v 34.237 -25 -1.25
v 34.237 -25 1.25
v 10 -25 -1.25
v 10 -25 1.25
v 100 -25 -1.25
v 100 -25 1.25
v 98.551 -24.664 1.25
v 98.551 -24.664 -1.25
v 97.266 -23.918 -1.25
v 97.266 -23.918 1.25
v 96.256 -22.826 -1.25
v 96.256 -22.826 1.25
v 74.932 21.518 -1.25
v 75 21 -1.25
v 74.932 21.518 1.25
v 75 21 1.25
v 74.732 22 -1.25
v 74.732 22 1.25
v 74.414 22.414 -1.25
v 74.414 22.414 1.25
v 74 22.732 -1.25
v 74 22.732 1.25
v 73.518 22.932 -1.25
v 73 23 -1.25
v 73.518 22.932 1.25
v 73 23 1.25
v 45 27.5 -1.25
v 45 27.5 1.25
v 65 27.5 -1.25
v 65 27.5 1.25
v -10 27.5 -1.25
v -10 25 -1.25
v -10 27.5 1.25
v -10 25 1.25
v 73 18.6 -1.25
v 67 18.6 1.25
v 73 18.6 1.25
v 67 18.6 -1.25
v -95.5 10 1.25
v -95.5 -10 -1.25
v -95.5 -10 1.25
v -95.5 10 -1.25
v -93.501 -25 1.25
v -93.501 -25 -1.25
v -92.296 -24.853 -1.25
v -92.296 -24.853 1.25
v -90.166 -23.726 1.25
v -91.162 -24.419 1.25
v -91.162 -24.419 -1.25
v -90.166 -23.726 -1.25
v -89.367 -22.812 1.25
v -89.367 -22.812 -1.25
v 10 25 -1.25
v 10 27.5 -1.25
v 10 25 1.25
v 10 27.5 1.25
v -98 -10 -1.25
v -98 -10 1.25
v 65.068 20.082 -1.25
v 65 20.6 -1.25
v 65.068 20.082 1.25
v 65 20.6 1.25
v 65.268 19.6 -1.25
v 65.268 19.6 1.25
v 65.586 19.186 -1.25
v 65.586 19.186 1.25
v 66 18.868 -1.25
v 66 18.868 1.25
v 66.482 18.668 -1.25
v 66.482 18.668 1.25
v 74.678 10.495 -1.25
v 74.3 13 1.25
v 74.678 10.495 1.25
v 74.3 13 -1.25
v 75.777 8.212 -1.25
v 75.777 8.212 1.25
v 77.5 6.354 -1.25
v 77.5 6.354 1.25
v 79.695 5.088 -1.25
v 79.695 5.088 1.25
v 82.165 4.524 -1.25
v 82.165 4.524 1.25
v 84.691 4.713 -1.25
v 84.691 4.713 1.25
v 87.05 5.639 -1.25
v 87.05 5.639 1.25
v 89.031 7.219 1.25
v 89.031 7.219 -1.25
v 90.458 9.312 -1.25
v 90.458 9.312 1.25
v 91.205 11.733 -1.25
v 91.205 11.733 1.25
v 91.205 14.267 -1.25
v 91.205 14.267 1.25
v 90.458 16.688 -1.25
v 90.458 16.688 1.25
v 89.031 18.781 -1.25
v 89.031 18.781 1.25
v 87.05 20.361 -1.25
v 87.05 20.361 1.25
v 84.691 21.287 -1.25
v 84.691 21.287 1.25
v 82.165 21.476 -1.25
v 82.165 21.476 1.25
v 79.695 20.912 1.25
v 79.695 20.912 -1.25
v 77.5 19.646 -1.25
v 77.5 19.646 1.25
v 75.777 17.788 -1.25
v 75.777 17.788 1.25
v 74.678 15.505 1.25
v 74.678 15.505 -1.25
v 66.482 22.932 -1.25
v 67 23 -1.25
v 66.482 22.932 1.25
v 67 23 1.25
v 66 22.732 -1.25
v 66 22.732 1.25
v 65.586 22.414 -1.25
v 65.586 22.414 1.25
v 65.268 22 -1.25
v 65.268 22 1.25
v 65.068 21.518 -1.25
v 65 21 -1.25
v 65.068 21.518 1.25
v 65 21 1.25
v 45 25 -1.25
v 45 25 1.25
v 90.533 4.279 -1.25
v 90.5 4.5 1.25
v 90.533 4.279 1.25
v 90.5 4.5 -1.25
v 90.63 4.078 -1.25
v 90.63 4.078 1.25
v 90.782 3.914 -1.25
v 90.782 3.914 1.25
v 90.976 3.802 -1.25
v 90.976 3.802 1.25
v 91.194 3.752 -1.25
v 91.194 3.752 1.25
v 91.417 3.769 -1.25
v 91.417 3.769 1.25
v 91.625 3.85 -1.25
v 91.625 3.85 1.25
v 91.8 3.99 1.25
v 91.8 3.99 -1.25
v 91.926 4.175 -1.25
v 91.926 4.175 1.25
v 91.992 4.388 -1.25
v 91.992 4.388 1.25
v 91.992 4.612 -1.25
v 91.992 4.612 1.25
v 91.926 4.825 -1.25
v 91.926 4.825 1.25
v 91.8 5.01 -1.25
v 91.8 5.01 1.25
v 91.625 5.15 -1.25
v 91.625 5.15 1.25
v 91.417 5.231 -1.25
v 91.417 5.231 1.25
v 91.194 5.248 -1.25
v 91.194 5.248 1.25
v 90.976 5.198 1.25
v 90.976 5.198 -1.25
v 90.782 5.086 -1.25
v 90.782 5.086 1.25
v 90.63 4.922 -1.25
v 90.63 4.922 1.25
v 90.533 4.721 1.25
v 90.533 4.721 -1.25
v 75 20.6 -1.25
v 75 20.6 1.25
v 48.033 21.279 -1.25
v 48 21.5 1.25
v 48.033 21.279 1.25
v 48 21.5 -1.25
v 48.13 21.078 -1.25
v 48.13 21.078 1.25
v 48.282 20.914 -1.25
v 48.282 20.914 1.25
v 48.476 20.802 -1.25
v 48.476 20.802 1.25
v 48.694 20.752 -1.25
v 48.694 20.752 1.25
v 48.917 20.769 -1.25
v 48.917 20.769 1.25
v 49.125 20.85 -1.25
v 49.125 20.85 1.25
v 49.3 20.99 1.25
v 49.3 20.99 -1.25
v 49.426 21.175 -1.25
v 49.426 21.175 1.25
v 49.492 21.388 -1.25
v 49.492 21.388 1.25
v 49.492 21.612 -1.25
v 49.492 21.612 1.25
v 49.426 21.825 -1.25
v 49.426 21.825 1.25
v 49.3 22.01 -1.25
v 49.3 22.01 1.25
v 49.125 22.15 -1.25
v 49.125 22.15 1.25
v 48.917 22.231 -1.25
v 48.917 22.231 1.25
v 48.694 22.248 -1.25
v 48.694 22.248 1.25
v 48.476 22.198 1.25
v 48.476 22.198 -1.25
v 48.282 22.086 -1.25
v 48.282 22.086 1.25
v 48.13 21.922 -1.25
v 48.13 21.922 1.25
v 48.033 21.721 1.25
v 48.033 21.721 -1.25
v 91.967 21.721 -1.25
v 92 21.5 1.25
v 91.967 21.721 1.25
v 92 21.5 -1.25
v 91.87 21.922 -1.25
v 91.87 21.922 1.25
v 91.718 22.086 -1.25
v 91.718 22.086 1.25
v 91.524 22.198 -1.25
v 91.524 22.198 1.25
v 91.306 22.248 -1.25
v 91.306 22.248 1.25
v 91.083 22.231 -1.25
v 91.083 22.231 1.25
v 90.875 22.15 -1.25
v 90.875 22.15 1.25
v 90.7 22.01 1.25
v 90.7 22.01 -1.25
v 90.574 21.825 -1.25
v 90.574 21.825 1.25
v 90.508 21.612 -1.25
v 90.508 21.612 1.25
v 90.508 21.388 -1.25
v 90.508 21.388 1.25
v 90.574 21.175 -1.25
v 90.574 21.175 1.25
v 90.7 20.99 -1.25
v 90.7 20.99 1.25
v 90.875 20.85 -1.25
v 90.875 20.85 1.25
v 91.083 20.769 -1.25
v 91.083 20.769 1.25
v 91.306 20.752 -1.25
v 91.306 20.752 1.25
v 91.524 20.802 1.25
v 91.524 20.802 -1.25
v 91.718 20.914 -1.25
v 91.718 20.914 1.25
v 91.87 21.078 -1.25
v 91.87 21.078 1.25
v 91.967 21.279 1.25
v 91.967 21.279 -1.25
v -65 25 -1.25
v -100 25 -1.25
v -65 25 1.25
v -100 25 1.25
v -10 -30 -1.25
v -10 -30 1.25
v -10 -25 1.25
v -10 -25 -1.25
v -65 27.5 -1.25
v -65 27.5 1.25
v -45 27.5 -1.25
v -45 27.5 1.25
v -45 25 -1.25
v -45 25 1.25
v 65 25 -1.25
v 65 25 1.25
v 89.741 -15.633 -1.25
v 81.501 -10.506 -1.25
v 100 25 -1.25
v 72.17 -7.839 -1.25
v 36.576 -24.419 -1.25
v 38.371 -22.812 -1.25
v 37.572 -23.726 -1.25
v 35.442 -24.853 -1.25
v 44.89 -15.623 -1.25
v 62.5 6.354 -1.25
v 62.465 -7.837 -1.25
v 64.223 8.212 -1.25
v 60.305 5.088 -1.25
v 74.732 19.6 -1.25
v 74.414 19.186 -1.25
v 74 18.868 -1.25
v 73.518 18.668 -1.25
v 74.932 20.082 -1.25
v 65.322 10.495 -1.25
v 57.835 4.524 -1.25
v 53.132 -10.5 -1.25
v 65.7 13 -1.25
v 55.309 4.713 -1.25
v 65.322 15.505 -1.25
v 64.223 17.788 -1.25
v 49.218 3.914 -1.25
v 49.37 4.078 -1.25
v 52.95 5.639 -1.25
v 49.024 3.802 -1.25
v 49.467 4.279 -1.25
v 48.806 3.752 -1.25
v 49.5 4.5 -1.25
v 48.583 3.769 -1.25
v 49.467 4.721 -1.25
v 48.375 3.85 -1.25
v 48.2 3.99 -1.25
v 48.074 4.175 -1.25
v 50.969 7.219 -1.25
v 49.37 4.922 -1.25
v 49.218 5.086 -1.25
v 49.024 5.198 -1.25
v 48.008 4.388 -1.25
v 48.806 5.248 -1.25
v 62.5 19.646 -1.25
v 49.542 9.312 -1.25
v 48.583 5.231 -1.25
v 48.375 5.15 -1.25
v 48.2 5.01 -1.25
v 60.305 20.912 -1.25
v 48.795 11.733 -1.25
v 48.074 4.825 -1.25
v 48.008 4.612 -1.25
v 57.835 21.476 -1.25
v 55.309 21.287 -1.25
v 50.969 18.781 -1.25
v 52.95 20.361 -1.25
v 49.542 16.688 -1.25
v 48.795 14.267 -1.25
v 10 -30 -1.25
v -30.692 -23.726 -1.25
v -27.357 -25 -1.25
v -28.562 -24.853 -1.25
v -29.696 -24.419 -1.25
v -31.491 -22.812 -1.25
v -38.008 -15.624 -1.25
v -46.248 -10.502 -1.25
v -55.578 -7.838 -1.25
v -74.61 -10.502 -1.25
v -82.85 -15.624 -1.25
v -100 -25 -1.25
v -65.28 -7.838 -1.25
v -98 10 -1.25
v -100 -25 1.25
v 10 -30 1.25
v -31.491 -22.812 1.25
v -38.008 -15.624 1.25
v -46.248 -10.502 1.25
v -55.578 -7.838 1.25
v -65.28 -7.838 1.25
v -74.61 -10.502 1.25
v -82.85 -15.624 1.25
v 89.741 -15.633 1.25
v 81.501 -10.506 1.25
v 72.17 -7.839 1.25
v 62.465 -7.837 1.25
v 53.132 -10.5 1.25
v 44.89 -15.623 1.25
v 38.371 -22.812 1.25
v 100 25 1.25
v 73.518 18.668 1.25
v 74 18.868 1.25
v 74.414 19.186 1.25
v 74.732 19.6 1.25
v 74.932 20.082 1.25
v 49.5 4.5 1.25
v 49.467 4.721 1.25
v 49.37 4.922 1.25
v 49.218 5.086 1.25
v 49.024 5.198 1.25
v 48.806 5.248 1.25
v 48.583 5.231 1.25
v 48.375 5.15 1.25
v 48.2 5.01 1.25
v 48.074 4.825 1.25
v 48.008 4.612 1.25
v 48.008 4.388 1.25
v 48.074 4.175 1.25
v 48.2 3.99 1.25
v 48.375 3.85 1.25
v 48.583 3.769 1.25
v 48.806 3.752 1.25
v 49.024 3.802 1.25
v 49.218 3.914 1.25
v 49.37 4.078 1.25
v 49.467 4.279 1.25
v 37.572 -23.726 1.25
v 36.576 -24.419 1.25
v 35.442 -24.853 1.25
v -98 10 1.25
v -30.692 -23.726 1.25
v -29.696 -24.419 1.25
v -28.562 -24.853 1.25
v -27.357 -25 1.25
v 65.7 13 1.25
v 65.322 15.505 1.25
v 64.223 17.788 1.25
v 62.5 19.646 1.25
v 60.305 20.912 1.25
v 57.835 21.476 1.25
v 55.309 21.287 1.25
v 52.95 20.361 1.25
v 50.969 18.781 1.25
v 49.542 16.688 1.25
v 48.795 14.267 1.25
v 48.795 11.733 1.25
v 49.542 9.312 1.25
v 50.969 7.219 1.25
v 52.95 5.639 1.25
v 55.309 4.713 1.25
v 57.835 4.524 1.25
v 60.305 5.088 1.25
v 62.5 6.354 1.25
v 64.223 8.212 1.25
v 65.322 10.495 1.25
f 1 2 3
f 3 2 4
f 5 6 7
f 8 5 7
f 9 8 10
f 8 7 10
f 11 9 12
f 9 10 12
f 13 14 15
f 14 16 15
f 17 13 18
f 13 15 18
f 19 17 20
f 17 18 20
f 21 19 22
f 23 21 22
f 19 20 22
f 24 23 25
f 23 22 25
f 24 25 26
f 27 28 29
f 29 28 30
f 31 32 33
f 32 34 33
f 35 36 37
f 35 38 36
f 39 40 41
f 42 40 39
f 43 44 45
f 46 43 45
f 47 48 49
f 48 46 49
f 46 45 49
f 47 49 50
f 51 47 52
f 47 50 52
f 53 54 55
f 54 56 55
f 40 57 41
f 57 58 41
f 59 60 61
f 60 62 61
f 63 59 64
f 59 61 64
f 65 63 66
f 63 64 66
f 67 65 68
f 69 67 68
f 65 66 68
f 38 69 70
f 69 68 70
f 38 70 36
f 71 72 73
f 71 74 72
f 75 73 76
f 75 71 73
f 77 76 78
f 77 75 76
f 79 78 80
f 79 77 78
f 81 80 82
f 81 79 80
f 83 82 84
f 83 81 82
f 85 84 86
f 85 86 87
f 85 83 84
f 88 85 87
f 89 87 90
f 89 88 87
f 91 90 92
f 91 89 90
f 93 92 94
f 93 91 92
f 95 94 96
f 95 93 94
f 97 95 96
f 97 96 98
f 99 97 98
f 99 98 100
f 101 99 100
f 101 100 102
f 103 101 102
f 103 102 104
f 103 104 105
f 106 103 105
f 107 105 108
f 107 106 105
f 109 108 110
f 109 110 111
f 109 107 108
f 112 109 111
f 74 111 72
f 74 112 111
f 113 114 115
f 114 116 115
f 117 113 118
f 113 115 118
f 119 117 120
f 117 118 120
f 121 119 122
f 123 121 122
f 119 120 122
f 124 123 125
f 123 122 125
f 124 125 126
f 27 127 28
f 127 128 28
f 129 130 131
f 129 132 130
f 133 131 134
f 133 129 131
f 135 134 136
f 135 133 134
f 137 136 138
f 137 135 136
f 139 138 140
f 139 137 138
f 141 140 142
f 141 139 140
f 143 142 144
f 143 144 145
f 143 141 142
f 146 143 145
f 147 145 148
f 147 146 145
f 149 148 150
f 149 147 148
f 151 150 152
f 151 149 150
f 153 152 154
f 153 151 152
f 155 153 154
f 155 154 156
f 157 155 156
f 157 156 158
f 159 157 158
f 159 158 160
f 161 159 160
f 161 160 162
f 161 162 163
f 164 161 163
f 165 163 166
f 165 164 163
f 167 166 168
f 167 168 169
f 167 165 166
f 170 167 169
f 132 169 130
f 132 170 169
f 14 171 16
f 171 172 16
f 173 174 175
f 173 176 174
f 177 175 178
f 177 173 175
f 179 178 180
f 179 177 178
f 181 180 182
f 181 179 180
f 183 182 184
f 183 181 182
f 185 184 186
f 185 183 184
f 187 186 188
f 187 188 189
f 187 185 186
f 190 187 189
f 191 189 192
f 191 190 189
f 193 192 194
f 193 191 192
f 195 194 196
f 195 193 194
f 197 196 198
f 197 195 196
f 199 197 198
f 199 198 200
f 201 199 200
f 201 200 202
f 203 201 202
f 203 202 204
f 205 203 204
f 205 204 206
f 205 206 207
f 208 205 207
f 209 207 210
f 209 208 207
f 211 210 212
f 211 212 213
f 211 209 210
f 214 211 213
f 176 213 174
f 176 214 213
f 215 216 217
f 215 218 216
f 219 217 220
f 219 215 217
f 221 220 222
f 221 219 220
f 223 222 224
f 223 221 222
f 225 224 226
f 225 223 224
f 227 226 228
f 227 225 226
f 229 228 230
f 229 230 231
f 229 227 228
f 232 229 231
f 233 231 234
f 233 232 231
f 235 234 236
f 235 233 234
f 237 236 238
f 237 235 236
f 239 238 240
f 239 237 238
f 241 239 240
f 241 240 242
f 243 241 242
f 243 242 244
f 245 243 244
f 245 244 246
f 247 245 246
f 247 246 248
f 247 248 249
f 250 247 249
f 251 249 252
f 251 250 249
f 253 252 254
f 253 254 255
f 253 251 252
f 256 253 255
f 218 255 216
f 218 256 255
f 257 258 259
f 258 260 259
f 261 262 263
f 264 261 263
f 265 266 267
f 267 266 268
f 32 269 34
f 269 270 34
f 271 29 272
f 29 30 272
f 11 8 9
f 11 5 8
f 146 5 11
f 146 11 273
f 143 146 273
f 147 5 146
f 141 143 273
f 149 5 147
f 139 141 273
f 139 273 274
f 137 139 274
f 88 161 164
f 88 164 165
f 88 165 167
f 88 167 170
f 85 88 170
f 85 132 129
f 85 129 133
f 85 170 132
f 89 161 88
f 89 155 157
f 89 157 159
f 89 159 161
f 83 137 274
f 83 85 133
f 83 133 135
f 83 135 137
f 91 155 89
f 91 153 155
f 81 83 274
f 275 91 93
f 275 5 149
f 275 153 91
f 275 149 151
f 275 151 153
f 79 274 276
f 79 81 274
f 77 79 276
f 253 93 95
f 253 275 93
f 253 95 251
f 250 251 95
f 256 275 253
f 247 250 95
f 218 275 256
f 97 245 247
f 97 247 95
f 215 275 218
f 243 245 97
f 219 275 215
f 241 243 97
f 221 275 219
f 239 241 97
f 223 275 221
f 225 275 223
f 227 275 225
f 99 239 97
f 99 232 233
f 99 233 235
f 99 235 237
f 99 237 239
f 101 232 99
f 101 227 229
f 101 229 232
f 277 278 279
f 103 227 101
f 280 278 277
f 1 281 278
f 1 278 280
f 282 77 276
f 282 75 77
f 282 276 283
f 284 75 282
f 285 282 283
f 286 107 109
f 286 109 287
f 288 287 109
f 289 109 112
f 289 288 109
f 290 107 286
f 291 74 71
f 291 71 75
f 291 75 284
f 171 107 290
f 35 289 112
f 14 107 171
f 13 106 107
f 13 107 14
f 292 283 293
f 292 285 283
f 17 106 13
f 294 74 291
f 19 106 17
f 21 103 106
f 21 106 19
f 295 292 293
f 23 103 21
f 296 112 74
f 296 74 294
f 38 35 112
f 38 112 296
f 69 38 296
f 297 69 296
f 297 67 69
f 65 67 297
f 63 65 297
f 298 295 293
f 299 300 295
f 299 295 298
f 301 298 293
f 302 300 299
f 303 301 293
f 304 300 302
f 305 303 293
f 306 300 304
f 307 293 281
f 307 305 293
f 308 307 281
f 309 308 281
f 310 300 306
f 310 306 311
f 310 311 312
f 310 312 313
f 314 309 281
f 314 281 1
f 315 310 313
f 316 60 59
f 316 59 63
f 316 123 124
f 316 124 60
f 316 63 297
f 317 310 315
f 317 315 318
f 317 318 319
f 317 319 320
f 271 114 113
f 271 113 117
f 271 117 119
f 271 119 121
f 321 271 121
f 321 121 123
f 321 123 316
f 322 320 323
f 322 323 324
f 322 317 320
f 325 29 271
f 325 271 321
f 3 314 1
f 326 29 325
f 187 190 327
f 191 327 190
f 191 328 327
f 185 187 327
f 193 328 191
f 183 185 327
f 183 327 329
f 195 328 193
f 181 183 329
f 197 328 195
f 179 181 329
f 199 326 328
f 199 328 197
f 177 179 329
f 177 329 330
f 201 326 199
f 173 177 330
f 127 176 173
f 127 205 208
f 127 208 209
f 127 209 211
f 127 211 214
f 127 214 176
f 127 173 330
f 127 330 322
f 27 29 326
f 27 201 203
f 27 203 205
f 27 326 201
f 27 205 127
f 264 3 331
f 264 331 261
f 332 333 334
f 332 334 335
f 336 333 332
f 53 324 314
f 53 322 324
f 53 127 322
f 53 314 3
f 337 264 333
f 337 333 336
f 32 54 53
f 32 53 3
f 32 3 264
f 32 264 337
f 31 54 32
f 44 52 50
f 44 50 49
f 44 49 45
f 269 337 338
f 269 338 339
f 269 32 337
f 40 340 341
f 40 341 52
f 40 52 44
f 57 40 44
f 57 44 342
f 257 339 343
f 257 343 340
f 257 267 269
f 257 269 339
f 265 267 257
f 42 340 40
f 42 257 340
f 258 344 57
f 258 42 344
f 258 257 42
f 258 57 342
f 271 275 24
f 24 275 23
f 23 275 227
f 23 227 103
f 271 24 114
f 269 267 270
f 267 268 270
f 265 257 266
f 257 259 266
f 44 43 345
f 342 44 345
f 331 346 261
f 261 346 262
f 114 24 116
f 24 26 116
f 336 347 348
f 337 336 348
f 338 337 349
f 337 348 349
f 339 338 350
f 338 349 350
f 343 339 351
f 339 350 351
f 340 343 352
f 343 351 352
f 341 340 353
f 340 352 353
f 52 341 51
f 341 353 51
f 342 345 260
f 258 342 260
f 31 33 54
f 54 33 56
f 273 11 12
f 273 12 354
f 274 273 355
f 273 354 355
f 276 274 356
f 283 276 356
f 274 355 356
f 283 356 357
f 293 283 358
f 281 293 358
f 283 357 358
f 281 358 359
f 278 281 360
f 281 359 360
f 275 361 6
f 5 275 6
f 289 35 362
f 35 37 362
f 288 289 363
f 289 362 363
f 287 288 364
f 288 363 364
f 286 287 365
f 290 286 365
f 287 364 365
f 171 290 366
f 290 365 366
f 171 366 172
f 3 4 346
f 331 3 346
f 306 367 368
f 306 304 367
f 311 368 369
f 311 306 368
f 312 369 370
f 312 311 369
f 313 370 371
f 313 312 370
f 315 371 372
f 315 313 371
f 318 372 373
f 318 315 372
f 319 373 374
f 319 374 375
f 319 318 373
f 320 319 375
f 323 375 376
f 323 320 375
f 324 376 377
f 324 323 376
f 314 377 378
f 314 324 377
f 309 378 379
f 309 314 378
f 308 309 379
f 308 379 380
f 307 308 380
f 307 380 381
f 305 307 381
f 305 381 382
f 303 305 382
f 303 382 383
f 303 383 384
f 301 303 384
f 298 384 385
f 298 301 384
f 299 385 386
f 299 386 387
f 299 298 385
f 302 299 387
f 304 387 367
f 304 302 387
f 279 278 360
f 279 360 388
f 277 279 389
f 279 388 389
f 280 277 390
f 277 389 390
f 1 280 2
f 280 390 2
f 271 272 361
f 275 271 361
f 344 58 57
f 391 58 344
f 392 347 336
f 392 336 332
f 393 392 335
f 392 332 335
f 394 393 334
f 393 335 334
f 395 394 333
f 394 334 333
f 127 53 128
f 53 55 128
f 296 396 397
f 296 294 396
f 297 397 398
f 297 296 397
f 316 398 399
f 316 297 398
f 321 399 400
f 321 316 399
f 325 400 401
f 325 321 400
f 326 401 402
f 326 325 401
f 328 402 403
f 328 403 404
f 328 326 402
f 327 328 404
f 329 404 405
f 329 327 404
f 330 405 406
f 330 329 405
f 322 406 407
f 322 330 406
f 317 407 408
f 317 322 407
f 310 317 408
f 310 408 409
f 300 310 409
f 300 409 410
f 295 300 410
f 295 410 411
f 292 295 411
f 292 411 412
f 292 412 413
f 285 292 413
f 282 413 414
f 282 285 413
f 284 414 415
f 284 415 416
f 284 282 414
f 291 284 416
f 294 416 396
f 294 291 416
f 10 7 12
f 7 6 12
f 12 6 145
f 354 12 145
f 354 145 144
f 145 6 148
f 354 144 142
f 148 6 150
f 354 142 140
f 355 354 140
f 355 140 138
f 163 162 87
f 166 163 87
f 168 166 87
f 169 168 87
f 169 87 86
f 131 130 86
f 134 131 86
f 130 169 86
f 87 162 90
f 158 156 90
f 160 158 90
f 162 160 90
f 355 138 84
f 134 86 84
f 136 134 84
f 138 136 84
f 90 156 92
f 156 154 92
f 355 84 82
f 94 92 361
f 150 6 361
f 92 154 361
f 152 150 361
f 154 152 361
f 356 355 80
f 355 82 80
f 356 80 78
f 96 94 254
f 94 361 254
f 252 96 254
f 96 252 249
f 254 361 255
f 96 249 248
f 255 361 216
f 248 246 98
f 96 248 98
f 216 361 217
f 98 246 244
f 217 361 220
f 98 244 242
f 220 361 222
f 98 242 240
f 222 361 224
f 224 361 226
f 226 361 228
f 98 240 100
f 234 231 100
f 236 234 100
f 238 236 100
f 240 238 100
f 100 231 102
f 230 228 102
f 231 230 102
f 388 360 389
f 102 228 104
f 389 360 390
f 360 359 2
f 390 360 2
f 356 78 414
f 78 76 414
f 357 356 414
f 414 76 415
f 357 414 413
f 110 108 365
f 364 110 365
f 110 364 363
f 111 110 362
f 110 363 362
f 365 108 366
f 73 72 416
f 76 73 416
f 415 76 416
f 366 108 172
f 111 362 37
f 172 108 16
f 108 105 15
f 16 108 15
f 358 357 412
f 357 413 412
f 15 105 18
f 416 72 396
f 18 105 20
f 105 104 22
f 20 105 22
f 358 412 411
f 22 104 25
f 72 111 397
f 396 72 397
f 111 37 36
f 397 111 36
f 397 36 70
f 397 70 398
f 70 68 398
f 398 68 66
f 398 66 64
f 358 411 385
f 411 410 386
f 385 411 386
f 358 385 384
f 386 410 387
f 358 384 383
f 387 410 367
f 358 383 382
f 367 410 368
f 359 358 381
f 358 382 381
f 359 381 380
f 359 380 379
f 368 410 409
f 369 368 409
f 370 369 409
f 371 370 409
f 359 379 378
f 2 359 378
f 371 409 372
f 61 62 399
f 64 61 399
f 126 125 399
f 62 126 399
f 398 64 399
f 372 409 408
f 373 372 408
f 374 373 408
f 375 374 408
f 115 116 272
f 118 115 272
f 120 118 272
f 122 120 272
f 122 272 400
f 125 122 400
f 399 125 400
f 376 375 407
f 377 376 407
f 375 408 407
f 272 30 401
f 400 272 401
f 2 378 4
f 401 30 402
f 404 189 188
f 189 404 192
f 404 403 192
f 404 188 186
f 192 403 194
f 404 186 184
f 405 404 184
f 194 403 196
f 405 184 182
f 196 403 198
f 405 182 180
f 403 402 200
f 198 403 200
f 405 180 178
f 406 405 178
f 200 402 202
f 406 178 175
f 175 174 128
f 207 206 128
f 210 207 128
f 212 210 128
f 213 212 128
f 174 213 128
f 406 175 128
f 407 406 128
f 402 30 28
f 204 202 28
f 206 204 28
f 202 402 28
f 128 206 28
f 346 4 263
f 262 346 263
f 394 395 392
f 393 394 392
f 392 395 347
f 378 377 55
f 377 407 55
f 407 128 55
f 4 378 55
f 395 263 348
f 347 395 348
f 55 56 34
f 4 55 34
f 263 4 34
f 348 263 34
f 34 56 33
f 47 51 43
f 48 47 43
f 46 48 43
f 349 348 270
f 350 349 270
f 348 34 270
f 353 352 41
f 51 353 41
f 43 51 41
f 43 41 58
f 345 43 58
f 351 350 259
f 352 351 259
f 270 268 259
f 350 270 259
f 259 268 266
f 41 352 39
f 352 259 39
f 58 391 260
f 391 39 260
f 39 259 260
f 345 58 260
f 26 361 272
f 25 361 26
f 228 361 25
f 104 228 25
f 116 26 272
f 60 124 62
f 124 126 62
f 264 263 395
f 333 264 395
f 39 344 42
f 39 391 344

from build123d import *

# Parameters (mm, degrees)
SKETCH1_R           = 8.5
SKETCH1_R_2         = 0.75
SKETCH1_W           = 2.5
SKETCH1_H           = 20
BOSS_EXTRUDE1_DEPTH = 1.25
FILLET2_R           = 5


with BuildPart() as part:
    # Sketch1 → Boss-Extrude1 (new, symmetric)
    with BuildSketch(Plane.XY):
        with BuildLine():
            Line((-100, -25), (-100, 25))
            Line((-100, 25), (-65, 25))
            Line((-65, 25), (-65, 27.5))
            Line((-65, 27.5), (-45, 27.5))
            Line((-45, 27.5), (-45, 25))
            Line((-45, 25), (-10, 25))
            Line((-10, 25), (-10, 27.5))
            Line((-10, 27.5), (10, 27.5))
            Line((10, 27.5), (10, 25))
            Line((10, 25), (45, 25))
            Line((45, 25), (45, 27.5))
            Line((45, 27.5), (65, 27.5))
            Line((65, 27.5), (65, 25))
            Line((65, 25), (100, 25))
            Line((100, 25), (100, -25))
            Line((100, -25), (97.62, -25))
            ThreePointArc((97.62, -25), (67.309110868, -7.5), (36.998221735, -25))
            Line((36.998221735, -25), (10, -25))
            Line((10, -25), (10, -30))
            Line((10, -30), (-10, -30))
            Line((-10, -30), (-10, -25))
            Line((-10, -25), (-30.118221735, -25))
            ThreePointArc((-30.118221735, -25), (-60.429110868, -7.5), (-90.74, -25))
            Line((-90.74, -25), (-100, -25))
        make_face()
        with Locations((57.2, 13)):
            Circle(SKETCH1_R, mode=Mode.SUBTRACT)
        with Locations((48.75, 4.5)):
            Circle(SKETCH1_R_2, mode=Mode.SUBTRACT)
        with Locations(Location((91.25, 4.5, 0), (0, 0, 180))):
            Circle(SKETCH1_R_2, mode=Mode.SUBTRACT)
        with Locations(Location((82.8, 13, 0), (0, 0, 180))):
            Circle(SKETCH1_R, mode=Mode.SUBTRACT)
        with Locations((91.25, 21.5)):
            Circle(SKETCH1_R_2, mode=Mode.SUBTRACT)
        with Locations(Location((48.75, 21.5, 0), (0, 0, 180))):
            Circle(SKETCH1_R_2, mode=Mode.SUBTRACT)
        with Locations((-96.75, 0)):
            Rectangle(SKETCH1_W, SKETCH1_H, mode=Mode.SUBTRACT)
        with BuildLine():
            Line((67, 18.6), (73, 18.6))
            ThreePointArc((73, 18.6), (74.414213562, 19.185786438), (75, 20.6))
            Line((75, 20.6), (75, 21))
            ThreePointArc((75, 21), (74.414213562, 22.414213562), (73, 23))
            Line((73, 23), (67, 23))
            ThreePointArc((67, 23), (65.585786438, 22.414213562), (65, 21))
            Line((65, 21), (65, 20.6))
            ThreePointArc((65, 20.6), (65.585786438, 19.185786438), (67, 18.6))
        make_face(mode=Mode.SUBTRACT)
    extrude(amount=BOSS_EXTRUDE1_DEPTH, both=True)

    # Fillet2
    # the kernel refuses this fillet: 5 mm, written as the material it takes off along each edge
    with BuildSketch(Plane(origin=(97.62, -25, 7.66613531), x_dir=(-0.5314154668172085, 0.8471113277648036, 0), z_dir=(0, 0, -1))) as fillet2_piece_1:
        with BuildLine():
            CenterArc((2.749772276, 4.996638315), FILLET2_R, 216.591278999, 51.307578807)
            Line((-1.264768811, 2.01612496), (-1.345059633, 1.956514693))
            ThreePointArc((-1.345059633, 1.956514693), (-0.717095538, 0.954920933), (-0.084711133, -0.053141547))
            Line((-0.084711133, -0.053141547), (0.003666363, -0.099932766))
            ThreePointArc((0.003666363, -0.099932766), (1.283227062, -0.076468208), (2.562787761, -0.099932766))
            Line((2.562787761, -0.099932766), (2.566454124, 0))
        make_face()
    extrude(amount=15.332270621, mode=Mode.SUBTRACT)
    with BuildSketch(Plane(origin=(36.998221735, -25, 8.15250564), x_dir=(-1, 0, 0), z_dir=(0, 0, -1)), Plane(origin=(-30.118221735, -25, -8.15250564), x_dir=(1, 0, 0), z_dir=(0, 0, 1))) as fillet2_piece_2:
        with BuildLine():
            CenterArc((2.761002256, 5), FILLET2_R, 214.228866328, 55.771133672)
            Line((-1.372984168, 2.1875), (-1.455663896, 2.13125))
            ThreePointArc((-1.455663896, 2.13125), (-0.751006819, 1.053257332), (-0.08660254, -0.05))
            Line((-0.08660254, -0.05), (0, -0.1))
            Line((0, -0.1), (2.761002256, -0.1))
            Line((2.761002256, -0.1), (2.761002256, 0))
        make_face()
    extrude(amount=16.305011279, mode=Mode.SUBTRACT)
    with BuildSketch(Plane(origin=(-90.74, -25, -8.15250564), x_dir=(-1, 0, 0), z_dir=(0, 0, 1))) as fillet2_piece_3:
        with BuildLine():
            CenterArc((2.761002256, -5), FILLET2_R, 90, 55.771133672)
            Line((-1.372984168, -2.1875), (-1.455663896, -2.13125))
            ThreePointArc((-1.455663896, -2.13125), (-0.751006819, -1.053257332), (-0.08660254, 0.05))
            Line((-0.08660254, 0.05), (0, 0.1))
            Line((0, 0.1), (2.761002256, 0.1))
            Line((2.761002256, 0.1), (2.761002256, 0))
        make_face()
    extrude(amount=16.305011279, mode=Mode.SUBTRACT)


solid = part.part
